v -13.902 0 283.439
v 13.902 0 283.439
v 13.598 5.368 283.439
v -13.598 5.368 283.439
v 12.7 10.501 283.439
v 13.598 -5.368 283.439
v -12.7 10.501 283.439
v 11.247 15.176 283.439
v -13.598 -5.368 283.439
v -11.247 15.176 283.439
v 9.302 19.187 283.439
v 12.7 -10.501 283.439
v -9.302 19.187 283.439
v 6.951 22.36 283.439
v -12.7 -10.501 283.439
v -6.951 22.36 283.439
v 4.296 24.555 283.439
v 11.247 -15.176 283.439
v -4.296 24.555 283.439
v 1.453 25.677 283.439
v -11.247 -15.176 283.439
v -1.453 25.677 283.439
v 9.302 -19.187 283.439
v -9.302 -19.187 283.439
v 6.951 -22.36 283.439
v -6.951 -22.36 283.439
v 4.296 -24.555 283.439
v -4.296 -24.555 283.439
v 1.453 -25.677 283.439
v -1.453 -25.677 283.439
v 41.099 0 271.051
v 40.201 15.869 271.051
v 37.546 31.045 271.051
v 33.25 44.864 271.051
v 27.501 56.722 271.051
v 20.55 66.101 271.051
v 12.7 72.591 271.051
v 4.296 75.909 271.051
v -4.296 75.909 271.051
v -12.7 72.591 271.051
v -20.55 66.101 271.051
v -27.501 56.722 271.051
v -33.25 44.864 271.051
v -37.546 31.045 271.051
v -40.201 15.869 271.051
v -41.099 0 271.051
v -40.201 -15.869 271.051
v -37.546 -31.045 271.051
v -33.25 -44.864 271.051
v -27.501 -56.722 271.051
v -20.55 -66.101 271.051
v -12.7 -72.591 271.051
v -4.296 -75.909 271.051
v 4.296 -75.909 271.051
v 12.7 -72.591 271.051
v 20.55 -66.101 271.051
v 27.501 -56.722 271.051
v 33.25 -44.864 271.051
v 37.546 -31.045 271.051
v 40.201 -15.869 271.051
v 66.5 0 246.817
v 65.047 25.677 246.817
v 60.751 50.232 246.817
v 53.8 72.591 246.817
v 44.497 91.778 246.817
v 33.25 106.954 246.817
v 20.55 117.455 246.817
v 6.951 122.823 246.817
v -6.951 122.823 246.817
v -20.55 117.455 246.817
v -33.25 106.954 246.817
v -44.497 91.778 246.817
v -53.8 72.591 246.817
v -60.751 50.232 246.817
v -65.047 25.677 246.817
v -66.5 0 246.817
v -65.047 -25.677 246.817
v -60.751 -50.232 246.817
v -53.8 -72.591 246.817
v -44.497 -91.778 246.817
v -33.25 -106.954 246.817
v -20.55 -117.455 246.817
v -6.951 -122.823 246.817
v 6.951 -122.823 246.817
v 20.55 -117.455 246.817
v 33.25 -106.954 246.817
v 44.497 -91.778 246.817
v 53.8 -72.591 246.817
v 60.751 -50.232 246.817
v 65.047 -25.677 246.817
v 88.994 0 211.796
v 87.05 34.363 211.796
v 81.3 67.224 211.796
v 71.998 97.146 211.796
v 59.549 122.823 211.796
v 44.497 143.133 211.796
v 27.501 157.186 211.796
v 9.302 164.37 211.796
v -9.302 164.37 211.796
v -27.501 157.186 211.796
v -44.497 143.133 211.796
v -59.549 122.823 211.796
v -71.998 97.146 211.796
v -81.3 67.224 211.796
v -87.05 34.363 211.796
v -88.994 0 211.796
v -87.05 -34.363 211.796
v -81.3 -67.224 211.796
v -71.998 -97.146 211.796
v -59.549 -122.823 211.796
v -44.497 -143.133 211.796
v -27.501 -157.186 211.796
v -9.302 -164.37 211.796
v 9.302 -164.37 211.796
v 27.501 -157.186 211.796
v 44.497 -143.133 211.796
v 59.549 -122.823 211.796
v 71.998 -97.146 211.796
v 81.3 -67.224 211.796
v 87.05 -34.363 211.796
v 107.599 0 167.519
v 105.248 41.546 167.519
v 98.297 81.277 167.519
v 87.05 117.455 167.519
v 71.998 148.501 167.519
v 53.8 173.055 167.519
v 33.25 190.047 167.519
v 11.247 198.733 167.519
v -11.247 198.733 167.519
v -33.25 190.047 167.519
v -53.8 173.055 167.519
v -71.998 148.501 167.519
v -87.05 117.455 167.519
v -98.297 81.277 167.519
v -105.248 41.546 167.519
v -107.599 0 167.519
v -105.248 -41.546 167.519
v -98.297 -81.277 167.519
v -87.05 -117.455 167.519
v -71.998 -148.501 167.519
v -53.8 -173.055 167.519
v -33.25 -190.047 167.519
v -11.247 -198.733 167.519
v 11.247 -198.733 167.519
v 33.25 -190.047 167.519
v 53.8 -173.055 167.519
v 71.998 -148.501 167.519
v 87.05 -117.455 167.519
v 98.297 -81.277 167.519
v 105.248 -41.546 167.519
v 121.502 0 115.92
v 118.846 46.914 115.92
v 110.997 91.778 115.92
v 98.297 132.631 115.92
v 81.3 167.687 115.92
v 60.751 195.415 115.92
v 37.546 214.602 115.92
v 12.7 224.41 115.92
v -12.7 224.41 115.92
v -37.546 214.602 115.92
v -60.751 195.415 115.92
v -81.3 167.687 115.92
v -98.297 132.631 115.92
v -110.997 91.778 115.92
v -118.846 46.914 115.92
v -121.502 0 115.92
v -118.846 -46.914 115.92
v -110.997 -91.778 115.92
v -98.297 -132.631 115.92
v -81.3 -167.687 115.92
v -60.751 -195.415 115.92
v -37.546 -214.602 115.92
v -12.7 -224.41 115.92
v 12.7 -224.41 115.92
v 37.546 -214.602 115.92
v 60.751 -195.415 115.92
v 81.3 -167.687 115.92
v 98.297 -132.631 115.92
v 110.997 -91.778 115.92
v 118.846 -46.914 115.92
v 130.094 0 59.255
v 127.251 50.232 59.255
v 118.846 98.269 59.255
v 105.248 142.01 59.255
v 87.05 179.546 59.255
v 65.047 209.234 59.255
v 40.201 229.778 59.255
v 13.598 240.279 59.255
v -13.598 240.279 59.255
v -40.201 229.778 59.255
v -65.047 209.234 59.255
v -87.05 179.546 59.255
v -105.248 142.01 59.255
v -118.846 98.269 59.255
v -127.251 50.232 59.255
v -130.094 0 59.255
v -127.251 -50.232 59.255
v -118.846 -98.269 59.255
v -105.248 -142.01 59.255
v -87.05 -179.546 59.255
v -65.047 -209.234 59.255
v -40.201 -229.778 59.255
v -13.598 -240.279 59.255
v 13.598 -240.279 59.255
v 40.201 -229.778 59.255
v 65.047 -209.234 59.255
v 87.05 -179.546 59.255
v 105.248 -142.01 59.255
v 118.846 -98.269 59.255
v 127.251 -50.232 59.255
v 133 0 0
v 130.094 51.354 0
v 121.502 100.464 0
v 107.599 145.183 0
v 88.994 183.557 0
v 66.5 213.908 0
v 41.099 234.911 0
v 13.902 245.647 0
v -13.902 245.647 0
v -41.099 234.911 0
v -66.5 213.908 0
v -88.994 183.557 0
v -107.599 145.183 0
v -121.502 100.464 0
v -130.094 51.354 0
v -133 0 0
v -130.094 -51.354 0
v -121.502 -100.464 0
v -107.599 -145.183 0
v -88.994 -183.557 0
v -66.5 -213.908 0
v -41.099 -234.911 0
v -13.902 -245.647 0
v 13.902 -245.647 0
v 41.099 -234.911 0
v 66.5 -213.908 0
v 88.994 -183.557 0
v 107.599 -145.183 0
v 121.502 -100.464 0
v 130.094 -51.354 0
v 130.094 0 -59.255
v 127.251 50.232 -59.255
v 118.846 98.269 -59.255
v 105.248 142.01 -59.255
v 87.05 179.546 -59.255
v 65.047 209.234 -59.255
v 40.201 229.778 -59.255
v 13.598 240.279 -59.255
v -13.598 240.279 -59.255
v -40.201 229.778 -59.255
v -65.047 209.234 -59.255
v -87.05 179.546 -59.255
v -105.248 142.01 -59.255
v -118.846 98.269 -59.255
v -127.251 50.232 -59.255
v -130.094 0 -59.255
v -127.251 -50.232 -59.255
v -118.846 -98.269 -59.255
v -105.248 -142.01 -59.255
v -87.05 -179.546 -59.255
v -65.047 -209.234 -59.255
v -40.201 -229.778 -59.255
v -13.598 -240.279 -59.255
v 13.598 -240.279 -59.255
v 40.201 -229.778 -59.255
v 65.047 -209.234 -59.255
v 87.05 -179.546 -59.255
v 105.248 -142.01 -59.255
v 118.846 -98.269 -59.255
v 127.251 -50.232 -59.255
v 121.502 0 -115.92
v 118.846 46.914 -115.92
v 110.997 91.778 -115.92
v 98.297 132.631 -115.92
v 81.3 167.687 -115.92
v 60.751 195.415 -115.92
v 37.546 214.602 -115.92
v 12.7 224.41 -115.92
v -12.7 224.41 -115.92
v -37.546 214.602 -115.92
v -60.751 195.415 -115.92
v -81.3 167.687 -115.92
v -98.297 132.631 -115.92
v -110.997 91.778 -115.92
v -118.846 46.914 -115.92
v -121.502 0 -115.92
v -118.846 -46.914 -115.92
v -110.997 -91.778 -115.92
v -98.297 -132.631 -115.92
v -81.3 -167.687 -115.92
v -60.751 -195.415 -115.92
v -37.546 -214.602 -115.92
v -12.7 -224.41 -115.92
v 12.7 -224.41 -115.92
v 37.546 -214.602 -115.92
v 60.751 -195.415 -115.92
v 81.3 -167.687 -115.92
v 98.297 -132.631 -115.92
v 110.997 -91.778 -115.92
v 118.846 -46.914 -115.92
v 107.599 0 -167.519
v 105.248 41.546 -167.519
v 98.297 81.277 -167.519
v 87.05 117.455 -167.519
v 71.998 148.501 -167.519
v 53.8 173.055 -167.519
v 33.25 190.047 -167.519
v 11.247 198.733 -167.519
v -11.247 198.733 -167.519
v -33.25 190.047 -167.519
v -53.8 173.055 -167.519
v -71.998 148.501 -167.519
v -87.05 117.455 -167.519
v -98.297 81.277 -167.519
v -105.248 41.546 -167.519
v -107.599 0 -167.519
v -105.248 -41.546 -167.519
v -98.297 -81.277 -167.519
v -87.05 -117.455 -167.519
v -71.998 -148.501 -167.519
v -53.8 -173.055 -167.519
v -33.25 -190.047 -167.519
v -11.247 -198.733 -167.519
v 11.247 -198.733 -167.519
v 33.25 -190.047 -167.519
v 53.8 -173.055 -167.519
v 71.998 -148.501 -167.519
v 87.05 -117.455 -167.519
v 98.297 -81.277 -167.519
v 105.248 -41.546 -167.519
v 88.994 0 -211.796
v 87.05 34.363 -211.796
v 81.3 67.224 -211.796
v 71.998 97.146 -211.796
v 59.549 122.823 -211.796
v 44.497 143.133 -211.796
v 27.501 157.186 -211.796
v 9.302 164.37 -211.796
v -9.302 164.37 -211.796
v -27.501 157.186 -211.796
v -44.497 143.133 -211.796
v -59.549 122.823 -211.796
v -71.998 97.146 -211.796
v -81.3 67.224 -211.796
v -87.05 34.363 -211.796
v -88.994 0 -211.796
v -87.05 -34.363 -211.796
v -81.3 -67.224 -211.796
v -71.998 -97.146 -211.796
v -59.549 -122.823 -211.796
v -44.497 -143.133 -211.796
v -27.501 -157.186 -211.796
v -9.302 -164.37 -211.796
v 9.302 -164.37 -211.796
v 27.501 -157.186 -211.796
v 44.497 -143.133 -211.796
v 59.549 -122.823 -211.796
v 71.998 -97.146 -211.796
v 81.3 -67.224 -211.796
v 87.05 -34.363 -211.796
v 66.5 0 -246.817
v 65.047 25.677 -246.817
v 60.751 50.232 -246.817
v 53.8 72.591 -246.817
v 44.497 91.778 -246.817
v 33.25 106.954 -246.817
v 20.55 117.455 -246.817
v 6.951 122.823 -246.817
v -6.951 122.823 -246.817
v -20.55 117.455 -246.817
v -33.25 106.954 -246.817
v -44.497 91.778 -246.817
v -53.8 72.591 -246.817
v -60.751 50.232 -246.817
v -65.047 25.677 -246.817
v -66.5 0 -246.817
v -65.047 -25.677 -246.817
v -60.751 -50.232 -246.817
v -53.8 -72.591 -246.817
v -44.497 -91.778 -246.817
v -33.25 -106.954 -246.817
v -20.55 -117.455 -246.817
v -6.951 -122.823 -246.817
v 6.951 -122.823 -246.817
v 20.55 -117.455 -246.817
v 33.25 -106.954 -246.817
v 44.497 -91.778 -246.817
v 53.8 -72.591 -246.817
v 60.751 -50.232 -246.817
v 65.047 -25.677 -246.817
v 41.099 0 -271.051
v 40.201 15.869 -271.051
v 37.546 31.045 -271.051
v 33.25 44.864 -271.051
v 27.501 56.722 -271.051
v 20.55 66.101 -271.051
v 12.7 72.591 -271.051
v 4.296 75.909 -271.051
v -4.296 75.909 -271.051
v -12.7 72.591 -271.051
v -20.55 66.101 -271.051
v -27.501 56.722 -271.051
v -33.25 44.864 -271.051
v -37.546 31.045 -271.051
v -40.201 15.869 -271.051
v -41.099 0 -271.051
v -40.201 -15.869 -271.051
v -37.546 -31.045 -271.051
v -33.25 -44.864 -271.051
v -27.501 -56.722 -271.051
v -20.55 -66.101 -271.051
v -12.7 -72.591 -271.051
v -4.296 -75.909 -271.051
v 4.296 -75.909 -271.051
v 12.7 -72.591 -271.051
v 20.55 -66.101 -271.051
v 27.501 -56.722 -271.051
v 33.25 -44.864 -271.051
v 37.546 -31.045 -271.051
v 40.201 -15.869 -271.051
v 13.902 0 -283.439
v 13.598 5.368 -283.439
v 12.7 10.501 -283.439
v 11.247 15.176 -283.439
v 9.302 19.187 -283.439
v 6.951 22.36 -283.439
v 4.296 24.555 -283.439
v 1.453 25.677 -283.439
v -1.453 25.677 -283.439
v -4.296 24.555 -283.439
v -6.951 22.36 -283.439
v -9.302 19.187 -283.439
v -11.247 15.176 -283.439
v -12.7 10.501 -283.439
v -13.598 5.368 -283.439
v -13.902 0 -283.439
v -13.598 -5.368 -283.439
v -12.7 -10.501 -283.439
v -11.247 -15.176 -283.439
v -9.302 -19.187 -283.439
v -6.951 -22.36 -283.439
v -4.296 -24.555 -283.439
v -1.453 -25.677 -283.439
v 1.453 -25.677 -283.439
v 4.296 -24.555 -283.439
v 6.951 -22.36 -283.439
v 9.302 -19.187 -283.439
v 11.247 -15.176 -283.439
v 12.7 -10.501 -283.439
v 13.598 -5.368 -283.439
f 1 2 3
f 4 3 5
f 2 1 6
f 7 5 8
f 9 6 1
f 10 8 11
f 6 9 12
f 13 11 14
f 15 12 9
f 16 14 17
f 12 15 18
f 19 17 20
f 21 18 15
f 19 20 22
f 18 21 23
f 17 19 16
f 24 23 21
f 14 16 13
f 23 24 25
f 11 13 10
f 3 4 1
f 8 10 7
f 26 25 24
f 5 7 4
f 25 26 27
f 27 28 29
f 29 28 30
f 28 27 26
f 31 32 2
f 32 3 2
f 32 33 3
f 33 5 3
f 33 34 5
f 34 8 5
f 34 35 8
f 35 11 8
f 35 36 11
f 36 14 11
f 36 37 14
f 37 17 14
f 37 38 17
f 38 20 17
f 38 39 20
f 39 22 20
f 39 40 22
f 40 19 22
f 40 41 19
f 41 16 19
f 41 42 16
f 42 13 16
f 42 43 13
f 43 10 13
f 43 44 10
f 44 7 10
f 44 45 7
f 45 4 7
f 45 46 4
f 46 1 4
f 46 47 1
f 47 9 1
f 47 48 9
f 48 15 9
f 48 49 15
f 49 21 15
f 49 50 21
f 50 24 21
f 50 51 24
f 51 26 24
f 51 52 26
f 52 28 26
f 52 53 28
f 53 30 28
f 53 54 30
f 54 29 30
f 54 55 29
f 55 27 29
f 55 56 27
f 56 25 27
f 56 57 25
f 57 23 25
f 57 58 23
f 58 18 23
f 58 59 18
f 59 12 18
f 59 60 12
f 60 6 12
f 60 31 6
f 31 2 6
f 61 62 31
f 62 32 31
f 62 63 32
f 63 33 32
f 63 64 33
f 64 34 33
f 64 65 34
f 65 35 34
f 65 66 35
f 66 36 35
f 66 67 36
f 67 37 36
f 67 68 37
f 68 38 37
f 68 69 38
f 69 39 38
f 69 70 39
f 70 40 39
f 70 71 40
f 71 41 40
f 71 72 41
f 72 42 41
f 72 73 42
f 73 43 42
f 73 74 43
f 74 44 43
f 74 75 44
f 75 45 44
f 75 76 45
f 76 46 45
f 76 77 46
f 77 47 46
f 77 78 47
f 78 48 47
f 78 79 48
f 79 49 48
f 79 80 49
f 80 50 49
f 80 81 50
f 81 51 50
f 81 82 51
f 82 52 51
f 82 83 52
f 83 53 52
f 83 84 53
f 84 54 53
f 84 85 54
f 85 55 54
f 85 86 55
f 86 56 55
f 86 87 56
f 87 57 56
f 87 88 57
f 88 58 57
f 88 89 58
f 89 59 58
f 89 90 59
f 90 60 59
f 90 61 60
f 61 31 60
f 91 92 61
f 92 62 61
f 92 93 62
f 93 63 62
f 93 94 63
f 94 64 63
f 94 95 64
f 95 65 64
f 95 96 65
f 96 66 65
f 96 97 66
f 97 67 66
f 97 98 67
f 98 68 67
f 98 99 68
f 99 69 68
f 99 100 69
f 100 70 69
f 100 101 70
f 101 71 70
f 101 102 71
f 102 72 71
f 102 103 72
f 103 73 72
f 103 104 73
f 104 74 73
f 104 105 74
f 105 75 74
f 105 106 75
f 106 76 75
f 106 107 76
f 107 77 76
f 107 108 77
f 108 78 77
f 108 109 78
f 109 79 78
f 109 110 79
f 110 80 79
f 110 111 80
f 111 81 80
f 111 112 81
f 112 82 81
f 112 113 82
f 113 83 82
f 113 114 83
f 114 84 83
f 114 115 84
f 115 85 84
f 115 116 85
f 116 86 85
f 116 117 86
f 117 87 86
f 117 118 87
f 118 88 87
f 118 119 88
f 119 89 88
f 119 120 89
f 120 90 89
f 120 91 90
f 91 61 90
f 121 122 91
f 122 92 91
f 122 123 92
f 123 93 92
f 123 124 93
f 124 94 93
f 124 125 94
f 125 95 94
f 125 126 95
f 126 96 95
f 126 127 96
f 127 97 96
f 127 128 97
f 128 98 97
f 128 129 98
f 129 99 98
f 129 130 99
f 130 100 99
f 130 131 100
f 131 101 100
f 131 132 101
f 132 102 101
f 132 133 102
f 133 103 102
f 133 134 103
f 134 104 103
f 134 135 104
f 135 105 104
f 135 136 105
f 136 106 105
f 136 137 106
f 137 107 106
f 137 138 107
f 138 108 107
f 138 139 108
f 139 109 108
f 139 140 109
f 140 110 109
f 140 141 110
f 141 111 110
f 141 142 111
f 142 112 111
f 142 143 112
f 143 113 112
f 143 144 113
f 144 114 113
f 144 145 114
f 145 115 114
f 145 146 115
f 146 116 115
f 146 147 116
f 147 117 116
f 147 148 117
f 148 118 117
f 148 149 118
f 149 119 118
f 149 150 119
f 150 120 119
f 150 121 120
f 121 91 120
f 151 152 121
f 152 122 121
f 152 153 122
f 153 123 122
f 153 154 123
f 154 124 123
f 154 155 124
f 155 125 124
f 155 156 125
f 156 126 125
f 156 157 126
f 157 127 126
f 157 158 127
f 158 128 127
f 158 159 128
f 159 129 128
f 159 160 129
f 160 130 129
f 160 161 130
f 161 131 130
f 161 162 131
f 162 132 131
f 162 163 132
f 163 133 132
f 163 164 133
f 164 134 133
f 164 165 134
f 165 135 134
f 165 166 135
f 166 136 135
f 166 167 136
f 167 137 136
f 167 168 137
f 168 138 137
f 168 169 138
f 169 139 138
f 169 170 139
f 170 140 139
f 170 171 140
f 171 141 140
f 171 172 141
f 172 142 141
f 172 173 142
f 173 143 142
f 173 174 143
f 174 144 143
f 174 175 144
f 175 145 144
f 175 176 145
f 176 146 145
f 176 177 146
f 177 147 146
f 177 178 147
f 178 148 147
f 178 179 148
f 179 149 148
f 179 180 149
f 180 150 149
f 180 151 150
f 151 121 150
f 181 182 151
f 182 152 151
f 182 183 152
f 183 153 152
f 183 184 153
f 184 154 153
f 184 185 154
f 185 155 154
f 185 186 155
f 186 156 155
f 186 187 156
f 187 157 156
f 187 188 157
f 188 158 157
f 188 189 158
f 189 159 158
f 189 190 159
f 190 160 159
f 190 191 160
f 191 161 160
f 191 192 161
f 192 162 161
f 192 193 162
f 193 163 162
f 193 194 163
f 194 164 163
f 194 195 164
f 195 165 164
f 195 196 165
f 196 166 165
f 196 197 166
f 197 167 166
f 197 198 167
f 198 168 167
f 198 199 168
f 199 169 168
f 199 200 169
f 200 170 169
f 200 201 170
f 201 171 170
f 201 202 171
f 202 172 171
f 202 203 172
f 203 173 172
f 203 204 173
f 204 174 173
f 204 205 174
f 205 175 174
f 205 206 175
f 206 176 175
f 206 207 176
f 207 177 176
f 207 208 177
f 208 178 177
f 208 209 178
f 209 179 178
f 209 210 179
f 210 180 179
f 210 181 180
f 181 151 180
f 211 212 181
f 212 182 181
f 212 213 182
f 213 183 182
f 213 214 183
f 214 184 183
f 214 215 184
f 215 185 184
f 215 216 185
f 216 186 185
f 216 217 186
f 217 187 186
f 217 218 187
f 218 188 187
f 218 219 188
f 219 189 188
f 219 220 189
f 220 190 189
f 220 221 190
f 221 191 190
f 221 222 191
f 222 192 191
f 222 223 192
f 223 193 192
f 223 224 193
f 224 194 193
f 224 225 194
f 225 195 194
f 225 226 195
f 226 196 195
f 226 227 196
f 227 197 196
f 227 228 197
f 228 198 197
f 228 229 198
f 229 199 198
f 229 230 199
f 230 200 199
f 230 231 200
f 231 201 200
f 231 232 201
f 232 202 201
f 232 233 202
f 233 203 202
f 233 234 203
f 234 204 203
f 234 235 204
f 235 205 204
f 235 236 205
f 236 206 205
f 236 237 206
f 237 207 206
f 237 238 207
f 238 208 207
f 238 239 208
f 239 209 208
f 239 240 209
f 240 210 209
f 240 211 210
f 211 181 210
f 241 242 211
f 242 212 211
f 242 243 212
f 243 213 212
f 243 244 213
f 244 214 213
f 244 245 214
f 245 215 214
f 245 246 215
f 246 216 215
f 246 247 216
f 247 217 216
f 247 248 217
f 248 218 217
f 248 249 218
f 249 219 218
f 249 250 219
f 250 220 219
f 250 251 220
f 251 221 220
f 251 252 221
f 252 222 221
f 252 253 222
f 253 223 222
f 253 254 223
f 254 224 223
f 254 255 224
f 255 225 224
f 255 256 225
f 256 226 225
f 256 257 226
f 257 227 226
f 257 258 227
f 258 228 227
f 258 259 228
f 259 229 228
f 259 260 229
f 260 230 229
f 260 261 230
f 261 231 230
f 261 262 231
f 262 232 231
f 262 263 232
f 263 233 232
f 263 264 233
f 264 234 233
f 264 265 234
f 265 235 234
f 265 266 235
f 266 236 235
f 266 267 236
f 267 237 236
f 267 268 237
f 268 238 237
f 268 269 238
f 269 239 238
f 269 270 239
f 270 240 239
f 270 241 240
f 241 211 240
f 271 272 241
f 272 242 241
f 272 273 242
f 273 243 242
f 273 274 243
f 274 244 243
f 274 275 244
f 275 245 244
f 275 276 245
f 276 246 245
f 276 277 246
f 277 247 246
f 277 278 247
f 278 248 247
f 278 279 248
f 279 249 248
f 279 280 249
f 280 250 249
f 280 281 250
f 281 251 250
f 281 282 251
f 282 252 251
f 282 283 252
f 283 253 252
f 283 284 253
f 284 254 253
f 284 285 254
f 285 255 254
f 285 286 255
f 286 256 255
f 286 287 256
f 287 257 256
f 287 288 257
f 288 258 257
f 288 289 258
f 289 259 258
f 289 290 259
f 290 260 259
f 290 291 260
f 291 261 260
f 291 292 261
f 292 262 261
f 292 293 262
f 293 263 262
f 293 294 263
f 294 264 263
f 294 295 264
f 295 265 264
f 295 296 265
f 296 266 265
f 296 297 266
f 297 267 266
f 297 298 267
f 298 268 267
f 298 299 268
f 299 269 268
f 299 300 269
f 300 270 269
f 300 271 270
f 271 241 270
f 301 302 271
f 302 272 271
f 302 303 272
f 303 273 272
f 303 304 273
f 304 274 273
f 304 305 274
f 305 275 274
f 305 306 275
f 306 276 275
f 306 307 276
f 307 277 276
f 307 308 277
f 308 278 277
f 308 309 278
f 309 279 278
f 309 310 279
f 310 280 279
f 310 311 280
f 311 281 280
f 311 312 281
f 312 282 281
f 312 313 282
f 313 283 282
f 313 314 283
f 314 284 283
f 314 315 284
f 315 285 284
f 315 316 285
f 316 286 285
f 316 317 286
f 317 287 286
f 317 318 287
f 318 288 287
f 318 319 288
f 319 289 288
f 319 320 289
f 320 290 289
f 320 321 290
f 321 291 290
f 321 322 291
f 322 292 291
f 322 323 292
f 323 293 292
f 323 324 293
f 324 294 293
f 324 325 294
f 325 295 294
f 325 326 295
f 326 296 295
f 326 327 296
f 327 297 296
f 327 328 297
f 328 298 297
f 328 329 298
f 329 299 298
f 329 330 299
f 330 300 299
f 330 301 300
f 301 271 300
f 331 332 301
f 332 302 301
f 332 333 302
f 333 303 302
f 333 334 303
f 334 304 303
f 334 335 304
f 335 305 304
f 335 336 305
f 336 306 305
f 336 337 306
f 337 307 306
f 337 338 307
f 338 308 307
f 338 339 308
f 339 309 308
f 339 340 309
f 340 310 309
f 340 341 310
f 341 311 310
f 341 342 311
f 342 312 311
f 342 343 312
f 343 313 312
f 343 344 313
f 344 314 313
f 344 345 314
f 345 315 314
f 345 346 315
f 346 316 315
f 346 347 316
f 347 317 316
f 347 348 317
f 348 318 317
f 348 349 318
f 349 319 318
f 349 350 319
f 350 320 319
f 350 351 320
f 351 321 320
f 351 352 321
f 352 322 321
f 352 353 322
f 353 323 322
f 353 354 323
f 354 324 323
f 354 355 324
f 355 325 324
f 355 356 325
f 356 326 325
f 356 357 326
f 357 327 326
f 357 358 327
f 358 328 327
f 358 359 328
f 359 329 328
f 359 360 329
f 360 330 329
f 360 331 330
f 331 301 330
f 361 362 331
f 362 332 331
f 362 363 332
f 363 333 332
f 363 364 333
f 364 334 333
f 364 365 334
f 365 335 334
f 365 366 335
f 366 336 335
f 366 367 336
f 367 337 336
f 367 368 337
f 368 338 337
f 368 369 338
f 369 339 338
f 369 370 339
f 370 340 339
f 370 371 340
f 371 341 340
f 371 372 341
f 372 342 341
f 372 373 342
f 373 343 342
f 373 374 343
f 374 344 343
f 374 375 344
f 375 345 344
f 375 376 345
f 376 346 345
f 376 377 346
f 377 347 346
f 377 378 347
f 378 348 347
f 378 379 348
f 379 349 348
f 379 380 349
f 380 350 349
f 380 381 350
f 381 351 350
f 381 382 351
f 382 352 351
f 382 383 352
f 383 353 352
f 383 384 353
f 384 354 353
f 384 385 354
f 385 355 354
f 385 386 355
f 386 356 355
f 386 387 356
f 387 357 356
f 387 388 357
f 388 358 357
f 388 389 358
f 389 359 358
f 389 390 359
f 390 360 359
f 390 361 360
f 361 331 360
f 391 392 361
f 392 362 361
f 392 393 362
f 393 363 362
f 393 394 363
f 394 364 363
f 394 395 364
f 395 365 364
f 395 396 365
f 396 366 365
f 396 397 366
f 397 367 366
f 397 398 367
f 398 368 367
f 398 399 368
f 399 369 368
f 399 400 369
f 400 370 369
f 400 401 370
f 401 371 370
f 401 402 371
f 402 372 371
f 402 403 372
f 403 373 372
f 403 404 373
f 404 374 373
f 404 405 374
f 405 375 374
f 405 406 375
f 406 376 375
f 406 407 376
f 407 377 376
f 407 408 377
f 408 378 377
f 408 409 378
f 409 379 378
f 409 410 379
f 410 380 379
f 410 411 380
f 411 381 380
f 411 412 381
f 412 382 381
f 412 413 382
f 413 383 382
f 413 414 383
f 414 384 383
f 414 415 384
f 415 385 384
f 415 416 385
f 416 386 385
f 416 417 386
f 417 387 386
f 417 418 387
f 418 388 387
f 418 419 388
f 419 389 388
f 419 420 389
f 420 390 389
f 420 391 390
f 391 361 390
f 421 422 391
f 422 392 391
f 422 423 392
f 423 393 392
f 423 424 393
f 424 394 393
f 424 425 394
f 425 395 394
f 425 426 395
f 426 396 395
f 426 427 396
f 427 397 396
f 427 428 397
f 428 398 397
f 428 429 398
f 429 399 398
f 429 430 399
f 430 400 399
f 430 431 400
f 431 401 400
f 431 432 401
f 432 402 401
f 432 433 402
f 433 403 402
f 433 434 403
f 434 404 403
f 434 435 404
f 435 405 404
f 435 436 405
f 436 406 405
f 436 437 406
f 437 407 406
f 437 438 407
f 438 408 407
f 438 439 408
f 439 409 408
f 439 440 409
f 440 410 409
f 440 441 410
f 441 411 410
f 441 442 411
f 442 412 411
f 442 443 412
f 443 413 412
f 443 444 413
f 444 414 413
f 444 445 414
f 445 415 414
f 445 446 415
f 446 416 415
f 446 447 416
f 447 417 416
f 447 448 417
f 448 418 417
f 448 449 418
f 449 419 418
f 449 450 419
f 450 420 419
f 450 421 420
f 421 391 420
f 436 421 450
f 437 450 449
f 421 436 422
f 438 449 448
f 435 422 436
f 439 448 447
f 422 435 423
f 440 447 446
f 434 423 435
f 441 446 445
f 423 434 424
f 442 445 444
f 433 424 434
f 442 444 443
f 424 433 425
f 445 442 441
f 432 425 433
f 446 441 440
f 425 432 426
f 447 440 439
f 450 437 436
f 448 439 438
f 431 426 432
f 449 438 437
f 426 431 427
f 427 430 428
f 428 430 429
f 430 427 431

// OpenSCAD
// Generated by SolidPython 1.0.1 on 2020-07-29 00:39:26


scale(v = [7, 13, 15]) {
	sphere(r = 19);
}
/***********************************************
*********      SolidPython code:      **********
************************************************
 
# import packages: SolidPython
from solid import *
from solid.utils import *
from itertools import chain, combinations


class Resize:

    def __init__(self, scad_file):
        self.scad_file = scad_file
        #self.scad_file = import_scad(scad_file)
        # cone/cylinder param:
        self.r1 = 0
        self.r2 = 0
        self.h = 0
        # rectangular prism param:
        self.w = 0
        self.l = 0
        # ellipse param:
        self.r = 0

    # import OpenScad code (file name corresponds to shape)


    # classify shape + parameters
    def assign(self, param1, param2, param3):
        if self.scad_file == 'cone.scad':
            self.r1 = param1
            self.r2 = param2
            self.h = param3
        elif self.scad_file == 'cylinder.scad':
            self.r1 = param1
            self.r2 = param2
            self.h = param3
        elif self.scad_file == 'rectangularPrism.scad':
            self.h = param1
            self.l = param2
            self.w = param3
        else:
            self.r = param1
            self.h = param2

    # resize parameters
    def iterate(self):
        x = range(3, 20, 2)
        i = 1
        if self.scad_file == 'cone.scad':
            tempList = list(combinations(x, 2))
            for temp in tempList:
                param1 = temp[0]
                param2 = temp[1]
                filepath = 'produced_scad_files/' + 'cone' + str(param1) + '_' + str(param2) + '_' + '.scad'
                scad_render_to_file(cylinder(h=param1, r1=param2, r2=0), filepath)

        elif self.scad_file == 'cylinder.scad':
            tempList = list(combinations(x, 3))
            for temp in tempList:
                param1 = temp[0]
                param2 = temp[1]
                filepath = 'produced_scad_files/' + 'cylinder' + str(param1) + '_' + str(param2) + '_' + '.scad'
                scad_render_to_file(cylinder(h=param1, r1=param2, r2=param2), filepath)

        elif self.scad_file == 'rectangularPrism.scad':
            tempList = list(combinations(x, 3))
            for temp in tempList:
                param1 = temp[0]
                param2 = temp[1]
                param3 = temp[2]
                filepath = 'produced_scad_files/' + 'rectangularPrism' + str(param1) + '_' + str(param2) + '_' + str(
                    param3) + '.scad'
                scad_render_to_file(cube(size=(param1, param2, param3)), filepath)

        elif self.scad_file == 'ellipse.scad':
            tempList = list(combinations(x, 4))
            for temp in tempList:
                param1 = temp[0]
                param2 = temp[1]
                param3 = temp[2]
                param4 = temp[3]
                filepath = 'produced_scad_files/' + 'ellipse' + str(param1) + '_' + str(param2) + '_' + str(param3) + '_' + str(param4) + '.scad'
                scad_render_to_file(scale([param1, param2, param3])(sphere(r=param4)), filepath)

    def render_to_scadfile(self):
        scad_render_to_file(scad, 'example.scad') 
 
************************************************/
